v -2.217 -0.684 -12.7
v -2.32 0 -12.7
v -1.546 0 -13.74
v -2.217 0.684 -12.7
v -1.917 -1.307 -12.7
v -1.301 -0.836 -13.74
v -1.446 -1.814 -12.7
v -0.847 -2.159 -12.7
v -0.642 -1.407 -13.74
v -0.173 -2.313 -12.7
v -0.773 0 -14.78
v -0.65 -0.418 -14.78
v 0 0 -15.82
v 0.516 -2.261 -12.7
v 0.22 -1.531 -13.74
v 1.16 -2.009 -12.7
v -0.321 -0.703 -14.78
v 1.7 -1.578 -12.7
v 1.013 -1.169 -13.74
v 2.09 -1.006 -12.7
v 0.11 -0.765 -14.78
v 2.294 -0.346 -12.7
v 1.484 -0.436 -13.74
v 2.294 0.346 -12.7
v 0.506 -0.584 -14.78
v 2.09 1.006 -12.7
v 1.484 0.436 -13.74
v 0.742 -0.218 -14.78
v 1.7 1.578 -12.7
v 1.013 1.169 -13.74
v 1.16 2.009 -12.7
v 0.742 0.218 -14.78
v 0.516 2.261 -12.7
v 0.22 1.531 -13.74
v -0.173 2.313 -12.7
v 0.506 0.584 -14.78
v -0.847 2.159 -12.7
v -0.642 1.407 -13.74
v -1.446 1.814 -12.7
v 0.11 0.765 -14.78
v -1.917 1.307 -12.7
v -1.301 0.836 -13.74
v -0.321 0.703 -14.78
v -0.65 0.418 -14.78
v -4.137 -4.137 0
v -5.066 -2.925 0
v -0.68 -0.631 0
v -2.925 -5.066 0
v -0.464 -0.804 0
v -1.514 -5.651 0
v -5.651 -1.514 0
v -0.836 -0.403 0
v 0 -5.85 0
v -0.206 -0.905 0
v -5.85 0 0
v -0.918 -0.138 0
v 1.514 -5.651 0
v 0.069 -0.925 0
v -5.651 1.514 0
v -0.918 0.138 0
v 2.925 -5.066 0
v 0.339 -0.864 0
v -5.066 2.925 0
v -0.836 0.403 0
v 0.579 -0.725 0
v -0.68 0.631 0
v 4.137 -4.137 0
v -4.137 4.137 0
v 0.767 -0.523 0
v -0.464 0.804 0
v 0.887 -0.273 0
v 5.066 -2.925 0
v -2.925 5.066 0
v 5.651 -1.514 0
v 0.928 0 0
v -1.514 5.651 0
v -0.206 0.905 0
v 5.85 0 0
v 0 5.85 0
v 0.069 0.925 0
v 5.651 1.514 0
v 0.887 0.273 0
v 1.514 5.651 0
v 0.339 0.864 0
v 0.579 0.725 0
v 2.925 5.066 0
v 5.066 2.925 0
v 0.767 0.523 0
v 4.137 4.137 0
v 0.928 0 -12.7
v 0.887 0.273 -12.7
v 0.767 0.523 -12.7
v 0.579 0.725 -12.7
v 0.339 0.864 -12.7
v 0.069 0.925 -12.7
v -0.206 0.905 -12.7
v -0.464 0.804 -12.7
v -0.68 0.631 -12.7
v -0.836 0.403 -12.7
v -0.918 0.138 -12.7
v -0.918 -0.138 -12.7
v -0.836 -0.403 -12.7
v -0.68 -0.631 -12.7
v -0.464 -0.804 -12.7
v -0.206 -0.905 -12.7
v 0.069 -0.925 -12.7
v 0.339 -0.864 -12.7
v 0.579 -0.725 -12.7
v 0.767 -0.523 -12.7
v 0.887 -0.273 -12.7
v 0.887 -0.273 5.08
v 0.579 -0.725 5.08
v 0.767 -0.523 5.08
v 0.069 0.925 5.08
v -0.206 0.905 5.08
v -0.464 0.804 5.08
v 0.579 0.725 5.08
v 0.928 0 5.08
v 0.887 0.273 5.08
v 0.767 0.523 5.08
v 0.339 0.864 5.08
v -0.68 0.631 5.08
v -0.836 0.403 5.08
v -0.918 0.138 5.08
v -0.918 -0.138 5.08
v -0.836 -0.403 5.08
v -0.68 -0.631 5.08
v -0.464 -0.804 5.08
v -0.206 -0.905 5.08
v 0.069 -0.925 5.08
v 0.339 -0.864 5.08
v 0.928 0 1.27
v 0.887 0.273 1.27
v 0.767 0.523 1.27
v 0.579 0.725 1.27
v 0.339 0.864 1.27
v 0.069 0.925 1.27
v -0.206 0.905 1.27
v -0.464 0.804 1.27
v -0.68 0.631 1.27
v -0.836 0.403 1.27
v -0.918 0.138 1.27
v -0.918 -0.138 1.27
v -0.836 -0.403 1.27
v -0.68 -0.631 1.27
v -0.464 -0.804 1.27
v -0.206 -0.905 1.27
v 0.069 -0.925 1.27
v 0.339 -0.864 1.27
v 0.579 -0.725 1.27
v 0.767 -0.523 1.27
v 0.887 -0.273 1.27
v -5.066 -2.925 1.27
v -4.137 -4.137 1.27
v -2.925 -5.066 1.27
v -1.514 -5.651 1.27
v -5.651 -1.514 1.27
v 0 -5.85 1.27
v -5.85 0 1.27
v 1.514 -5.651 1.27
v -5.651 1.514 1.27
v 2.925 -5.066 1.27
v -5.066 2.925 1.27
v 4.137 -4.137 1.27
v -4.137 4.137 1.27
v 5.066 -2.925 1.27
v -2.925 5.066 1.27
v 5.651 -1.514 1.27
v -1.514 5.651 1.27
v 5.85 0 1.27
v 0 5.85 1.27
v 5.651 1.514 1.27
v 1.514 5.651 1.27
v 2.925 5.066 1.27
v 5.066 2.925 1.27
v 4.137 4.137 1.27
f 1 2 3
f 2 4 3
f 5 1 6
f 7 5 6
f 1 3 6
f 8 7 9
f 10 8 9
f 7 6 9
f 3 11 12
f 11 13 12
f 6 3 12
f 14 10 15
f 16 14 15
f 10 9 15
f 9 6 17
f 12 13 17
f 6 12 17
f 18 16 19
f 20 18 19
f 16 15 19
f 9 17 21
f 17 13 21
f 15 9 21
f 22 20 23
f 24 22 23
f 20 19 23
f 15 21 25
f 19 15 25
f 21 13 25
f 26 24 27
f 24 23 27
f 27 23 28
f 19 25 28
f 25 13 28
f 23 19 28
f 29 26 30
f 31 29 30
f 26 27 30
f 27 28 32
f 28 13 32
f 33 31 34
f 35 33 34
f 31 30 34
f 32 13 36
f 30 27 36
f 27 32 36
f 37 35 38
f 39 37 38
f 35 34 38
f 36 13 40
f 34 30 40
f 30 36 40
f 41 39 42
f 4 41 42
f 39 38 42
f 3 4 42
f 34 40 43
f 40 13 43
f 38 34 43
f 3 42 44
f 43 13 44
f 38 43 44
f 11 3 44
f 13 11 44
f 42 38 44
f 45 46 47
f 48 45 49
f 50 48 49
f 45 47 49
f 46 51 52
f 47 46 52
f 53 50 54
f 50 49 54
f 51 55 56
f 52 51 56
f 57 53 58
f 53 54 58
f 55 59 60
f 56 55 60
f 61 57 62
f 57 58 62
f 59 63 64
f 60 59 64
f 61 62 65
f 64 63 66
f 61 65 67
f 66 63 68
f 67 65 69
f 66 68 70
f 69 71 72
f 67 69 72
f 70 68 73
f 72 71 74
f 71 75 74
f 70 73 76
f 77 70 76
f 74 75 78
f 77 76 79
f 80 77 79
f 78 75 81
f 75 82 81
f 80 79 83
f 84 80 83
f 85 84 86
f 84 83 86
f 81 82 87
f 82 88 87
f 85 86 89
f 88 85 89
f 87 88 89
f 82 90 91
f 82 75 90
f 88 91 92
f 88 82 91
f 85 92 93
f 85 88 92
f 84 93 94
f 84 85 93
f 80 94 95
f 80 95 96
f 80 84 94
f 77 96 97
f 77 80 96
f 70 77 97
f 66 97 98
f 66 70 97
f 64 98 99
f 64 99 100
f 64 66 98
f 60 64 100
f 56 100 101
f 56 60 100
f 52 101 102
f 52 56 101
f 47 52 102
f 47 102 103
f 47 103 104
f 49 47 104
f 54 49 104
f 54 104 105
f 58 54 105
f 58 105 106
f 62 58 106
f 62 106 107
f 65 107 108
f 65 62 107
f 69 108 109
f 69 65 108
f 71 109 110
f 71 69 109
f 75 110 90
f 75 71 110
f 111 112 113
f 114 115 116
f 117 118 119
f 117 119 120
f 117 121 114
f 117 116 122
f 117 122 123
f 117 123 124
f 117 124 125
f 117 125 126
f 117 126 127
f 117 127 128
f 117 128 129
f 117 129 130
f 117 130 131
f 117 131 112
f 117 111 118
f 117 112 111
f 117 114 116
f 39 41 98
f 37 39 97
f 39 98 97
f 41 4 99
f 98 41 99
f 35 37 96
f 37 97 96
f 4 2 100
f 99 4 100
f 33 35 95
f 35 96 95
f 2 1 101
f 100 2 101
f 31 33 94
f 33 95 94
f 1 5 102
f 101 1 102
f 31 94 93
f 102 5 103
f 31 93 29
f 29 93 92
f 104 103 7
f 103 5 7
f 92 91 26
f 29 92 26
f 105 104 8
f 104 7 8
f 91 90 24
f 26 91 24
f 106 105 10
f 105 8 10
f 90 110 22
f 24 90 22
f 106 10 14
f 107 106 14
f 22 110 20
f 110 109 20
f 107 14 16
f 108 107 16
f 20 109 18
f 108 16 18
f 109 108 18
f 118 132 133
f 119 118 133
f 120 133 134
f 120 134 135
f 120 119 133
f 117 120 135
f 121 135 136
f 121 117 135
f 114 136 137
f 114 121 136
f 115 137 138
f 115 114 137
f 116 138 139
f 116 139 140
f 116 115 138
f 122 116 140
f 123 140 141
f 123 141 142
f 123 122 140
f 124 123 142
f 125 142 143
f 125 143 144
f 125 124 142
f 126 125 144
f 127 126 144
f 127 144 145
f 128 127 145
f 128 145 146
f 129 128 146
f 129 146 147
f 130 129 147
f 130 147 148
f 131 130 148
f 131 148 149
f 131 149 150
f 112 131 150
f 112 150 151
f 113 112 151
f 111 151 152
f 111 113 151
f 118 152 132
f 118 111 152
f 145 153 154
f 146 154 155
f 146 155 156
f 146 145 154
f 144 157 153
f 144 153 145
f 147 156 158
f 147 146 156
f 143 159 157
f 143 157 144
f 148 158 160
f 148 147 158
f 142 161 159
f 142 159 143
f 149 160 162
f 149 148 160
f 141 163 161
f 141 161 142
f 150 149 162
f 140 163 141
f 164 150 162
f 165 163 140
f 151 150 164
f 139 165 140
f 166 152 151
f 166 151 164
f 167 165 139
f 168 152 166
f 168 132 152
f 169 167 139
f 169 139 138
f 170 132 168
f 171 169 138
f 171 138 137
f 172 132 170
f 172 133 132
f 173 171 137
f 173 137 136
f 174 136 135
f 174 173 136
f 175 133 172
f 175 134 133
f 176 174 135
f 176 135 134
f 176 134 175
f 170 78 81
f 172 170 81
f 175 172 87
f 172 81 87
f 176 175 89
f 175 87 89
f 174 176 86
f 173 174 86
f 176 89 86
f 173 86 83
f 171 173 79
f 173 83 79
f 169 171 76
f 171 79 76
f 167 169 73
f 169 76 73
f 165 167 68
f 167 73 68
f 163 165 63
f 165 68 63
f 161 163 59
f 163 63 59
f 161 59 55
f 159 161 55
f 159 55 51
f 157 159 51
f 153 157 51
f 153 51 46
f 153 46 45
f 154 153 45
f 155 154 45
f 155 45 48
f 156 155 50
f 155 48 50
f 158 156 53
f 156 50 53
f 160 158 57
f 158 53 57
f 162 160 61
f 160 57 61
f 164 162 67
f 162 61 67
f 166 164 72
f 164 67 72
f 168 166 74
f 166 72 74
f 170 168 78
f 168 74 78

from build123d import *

# Parameters (mm, degrees)
F0_R     = 0.9278723563
F1_DEPTH = 12.7
F4_DEPTH = 7.62
F5_R     = 5.8500473035
F6_DEPTH = 1.27


with BuildPart() as f1:
    # F0 (on Top) → F1 (new body, symmetric)
    with BuildSketch(Plane.XY):
        Circle(F0_R)
    extrude(amount=F1_DEPTH, both=True)

    # F2 (on Front) → F3 (revolve)
    with BuildSketch(Plane.XZ):
        Polygon((0, -15.8198643476), (0, -12.7), (-2.3196195252, -12.7), align=None)
    revolve(axis=Axis((0, 0, -14.2599321738), (0, 0, 1)))

    # F4 (cut): a face of the model
    f4_faces = [f1.faces().sort_by_distance(p)[0] for p in [
        (0, 0, 12.7),
    ]]
    extrude(f4_faces, amount=-F4_DEPTH, mode=Mode.SUBTRACT)

    # F5 (on Top) → F6 (join)
    with BuildSketch(Plane.XY):
        Circle(F5_R)
    extrude(amount=F6_DEPTH)


solid = f1.part
